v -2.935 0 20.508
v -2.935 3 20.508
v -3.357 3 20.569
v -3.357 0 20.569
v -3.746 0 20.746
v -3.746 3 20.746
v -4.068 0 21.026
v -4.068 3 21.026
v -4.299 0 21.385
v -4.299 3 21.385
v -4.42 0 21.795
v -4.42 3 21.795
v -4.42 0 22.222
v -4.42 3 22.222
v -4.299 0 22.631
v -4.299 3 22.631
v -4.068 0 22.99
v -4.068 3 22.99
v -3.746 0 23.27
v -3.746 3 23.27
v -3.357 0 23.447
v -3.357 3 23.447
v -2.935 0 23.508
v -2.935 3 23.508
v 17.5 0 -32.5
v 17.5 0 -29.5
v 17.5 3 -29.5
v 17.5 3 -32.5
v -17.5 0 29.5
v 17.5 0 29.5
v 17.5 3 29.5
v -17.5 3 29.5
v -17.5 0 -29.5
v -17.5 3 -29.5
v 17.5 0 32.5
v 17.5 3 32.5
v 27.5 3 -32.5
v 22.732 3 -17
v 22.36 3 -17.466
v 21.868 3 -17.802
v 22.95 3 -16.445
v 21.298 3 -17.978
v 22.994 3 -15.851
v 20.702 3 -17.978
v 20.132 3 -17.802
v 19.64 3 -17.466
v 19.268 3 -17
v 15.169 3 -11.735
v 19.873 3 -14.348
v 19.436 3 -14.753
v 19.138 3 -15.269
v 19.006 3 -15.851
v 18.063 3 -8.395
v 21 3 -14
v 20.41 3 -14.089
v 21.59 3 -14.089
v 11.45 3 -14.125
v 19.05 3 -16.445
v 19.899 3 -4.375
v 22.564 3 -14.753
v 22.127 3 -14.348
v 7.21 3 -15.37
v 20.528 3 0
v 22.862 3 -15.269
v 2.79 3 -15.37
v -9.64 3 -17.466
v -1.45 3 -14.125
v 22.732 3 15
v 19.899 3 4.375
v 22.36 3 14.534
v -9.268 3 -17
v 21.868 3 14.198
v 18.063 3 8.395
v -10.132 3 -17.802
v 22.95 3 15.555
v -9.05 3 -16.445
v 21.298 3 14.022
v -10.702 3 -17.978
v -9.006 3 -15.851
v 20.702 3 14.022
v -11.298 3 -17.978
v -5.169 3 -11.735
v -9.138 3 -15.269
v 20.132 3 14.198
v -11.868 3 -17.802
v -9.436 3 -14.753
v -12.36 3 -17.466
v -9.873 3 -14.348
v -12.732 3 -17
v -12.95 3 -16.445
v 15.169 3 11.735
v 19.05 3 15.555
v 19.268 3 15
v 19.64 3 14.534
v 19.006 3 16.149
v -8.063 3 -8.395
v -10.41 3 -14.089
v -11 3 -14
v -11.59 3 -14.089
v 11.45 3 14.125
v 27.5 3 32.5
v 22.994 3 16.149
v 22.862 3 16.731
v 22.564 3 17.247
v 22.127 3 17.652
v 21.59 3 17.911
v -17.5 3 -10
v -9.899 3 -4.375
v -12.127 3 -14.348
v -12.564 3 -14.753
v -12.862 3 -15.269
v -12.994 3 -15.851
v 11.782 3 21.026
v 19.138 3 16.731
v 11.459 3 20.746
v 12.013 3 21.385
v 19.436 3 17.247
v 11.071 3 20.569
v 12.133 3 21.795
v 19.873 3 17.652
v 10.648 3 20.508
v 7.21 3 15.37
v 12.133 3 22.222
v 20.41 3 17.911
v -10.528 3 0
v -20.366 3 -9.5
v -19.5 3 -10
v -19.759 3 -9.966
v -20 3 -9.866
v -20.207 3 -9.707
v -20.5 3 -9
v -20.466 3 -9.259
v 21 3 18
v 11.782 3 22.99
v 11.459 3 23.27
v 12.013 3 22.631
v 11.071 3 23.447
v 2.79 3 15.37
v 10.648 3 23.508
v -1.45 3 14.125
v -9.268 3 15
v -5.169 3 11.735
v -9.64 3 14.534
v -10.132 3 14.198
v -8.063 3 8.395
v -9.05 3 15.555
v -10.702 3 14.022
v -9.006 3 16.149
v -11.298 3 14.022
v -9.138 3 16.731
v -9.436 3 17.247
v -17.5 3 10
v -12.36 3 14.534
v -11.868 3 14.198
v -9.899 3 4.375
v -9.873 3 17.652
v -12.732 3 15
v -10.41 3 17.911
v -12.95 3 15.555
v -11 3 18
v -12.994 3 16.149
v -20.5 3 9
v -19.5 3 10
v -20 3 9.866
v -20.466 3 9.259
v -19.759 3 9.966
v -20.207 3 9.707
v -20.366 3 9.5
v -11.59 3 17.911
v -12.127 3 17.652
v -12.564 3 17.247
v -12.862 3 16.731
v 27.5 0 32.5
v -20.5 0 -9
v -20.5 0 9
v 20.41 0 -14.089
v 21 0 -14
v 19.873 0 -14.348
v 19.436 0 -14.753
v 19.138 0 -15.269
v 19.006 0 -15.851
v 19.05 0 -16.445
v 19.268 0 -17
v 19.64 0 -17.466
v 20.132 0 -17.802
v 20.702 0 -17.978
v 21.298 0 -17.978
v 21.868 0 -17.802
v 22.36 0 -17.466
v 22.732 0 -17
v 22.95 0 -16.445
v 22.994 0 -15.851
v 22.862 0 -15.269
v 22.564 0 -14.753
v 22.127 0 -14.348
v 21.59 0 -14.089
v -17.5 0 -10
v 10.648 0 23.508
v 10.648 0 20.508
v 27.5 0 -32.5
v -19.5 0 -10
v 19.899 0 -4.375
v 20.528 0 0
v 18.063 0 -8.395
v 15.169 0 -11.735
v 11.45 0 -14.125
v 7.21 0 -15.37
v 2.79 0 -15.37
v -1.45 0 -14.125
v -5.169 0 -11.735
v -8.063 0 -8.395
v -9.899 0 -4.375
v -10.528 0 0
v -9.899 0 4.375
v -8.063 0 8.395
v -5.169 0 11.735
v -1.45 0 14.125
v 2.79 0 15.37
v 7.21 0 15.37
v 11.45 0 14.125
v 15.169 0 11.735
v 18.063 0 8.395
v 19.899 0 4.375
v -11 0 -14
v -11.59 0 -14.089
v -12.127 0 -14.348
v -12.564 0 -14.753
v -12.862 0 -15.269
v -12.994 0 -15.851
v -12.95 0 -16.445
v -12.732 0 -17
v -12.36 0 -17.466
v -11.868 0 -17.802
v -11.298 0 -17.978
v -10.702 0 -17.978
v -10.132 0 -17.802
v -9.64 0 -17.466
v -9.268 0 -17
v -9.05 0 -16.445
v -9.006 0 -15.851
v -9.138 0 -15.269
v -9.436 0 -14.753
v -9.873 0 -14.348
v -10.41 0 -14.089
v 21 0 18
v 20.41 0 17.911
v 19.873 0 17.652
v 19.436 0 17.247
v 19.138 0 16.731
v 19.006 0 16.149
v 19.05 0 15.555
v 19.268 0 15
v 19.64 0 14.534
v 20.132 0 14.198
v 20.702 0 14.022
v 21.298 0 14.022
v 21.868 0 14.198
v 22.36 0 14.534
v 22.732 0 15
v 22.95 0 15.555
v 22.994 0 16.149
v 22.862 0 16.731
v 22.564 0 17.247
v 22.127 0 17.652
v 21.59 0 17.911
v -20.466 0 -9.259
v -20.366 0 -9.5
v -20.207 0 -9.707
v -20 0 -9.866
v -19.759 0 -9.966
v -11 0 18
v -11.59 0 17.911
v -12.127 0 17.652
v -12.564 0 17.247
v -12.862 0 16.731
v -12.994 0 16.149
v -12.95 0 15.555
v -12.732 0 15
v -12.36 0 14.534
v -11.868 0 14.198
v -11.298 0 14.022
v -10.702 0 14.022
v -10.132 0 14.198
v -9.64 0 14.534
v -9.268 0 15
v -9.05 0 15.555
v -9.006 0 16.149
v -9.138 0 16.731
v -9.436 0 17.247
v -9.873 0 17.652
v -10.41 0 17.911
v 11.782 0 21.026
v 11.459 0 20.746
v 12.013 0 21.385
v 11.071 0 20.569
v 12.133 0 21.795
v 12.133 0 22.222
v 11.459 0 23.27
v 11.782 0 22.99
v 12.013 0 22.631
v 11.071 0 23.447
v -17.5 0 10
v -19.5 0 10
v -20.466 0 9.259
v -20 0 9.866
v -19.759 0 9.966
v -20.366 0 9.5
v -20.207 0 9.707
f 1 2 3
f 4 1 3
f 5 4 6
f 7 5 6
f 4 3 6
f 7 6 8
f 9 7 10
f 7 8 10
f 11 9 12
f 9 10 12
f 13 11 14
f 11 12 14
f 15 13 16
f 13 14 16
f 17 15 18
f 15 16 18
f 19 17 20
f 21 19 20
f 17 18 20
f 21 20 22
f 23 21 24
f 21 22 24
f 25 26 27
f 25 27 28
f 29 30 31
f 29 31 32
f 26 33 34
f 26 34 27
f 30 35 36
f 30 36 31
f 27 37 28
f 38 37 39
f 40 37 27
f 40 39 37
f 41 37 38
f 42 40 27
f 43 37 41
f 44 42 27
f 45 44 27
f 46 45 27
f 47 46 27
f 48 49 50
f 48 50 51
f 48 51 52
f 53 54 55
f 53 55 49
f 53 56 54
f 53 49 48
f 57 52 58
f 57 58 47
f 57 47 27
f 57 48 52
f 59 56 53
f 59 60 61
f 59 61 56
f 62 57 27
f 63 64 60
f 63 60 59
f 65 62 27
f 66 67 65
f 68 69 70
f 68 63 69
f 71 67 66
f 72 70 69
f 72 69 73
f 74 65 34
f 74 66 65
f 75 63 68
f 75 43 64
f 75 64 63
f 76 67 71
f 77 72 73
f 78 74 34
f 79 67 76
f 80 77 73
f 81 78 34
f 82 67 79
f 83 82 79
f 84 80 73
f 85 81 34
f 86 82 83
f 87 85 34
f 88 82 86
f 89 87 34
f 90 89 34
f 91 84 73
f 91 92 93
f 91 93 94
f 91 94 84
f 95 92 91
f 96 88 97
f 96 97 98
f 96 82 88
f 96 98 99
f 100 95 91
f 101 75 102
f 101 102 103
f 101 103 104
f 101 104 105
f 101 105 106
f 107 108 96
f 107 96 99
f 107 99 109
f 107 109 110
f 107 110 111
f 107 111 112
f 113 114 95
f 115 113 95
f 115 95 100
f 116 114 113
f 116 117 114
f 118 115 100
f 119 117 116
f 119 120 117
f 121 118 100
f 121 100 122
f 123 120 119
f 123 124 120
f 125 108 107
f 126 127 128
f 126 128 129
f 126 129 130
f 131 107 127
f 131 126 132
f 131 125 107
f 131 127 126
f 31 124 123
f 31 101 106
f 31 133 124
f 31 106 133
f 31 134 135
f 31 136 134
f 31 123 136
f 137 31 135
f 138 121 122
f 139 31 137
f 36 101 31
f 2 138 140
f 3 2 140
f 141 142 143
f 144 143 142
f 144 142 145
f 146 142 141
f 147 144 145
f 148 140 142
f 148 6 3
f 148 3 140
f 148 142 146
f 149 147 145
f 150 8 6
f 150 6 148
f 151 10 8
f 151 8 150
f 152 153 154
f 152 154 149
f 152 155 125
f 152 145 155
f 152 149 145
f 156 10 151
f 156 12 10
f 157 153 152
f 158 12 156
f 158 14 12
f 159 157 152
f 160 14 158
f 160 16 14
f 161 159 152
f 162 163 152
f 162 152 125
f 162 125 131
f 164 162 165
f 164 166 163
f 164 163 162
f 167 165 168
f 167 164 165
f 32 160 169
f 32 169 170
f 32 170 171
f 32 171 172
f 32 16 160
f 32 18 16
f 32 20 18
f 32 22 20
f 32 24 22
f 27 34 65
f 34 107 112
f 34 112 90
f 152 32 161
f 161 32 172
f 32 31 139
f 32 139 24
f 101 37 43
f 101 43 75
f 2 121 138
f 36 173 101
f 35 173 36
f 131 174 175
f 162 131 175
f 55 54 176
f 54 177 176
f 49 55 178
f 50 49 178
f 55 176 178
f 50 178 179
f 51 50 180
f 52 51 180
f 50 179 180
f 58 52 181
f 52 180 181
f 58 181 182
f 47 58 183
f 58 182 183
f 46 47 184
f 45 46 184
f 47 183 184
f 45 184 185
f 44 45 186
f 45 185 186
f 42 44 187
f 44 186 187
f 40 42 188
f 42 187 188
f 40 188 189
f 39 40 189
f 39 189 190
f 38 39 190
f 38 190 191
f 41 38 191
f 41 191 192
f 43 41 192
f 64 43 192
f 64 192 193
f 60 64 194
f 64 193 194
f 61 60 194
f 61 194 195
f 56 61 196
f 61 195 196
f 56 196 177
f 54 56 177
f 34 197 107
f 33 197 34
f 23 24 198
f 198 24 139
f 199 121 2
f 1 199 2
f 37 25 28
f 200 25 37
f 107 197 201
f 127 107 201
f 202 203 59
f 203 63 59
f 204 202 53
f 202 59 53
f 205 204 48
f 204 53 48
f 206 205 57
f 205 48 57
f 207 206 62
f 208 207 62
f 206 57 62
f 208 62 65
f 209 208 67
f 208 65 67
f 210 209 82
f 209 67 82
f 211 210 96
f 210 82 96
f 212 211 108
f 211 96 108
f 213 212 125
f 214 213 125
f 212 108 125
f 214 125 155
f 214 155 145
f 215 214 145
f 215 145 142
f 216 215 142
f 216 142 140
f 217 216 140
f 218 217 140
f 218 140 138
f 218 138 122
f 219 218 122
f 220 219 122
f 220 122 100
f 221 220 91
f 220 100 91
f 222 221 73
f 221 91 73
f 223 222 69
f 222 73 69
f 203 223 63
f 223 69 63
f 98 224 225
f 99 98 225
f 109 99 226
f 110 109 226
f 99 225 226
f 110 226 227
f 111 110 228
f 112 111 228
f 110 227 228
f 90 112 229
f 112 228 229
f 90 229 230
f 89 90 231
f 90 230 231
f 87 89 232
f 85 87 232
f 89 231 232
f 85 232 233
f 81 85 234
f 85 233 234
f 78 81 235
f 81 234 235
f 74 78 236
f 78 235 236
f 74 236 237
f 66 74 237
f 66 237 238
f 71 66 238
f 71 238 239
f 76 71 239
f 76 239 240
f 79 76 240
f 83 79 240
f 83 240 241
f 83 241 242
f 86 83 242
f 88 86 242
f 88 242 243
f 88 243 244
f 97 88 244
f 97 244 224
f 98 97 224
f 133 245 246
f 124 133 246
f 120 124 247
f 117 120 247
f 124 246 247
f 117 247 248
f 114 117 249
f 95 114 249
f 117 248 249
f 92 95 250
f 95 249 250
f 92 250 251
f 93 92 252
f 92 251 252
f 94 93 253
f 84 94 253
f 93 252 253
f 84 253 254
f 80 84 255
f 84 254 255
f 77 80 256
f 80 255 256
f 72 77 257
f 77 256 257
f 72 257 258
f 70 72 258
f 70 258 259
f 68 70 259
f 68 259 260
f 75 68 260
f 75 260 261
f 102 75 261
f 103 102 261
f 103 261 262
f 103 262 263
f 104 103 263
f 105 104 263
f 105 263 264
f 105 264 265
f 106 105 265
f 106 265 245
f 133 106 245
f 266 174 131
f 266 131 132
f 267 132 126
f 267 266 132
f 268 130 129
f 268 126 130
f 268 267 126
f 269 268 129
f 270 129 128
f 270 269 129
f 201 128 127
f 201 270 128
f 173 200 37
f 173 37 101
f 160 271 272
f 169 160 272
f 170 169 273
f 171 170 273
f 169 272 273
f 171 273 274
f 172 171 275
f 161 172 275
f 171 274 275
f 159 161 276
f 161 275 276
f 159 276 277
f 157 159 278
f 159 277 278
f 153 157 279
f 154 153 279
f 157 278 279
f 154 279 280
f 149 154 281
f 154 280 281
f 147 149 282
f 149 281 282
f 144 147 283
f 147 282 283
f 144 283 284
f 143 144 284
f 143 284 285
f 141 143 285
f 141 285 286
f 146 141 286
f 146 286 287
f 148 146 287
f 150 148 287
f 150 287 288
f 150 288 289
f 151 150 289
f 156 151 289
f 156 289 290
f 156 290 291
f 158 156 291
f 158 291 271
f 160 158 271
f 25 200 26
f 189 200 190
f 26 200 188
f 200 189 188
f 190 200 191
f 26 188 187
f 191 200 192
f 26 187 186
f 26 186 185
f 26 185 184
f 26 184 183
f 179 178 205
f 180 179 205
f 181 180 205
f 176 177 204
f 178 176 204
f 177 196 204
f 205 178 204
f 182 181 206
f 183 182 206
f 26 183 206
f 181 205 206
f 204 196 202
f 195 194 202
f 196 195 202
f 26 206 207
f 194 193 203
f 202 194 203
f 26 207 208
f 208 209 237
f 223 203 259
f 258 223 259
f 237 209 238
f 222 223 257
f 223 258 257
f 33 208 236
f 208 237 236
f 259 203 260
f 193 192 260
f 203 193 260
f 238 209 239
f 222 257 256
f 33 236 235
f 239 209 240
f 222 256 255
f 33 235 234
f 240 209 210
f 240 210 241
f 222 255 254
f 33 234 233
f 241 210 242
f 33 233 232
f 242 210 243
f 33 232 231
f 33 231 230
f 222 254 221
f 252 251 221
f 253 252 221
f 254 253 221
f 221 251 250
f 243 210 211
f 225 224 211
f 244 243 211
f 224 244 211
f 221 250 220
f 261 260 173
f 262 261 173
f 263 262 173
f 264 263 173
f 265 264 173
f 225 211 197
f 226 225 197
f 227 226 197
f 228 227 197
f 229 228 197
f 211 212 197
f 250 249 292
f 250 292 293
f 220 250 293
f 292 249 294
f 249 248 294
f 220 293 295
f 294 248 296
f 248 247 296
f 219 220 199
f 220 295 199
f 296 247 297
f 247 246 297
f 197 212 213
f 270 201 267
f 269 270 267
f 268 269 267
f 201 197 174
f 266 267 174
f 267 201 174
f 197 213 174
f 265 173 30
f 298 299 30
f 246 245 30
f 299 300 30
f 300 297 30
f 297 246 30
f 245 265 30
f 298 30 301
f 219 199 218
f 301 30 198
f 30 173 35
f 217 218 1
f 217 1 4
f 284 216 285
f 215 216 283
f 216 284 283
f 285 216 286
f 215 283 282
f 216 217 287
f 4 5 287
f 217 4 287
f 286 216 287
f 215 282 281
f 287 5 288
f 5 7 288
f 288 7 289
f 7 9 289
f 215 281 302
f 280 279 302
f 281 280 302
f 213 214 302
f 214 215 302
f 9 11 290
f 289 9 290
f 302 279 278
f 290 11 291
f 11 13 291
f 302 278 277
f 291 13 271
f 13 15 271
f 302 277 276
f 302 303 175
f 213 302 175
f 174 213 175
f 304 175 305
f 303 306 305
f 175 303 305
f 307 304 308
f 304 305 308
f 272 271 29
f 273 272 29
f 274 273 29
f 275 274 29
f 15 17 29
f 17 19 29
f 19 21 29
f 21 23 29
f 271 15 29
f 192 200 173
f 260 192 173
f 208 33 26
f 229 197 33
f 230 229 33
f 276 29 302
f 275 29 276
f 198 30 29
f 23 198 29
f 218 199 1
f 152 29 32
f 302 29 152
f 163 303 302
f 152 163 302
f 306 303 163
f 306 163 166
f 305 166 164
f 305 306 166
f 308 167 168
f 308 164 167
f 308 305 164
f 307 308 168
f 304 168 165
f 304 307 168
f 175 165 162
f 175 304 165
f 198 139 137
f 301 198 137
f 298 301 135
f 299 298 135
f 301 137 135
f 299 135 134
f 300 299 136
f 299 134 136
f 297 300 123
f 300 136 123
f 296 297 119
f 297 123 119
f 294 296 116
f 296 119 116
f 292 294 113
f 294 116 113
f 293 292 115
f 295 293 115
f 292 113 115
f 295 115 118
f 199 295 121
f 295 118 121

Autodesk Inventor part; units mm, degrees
ref_plane "YZ Plane" through (0, 0, 0) normal (1, 0, 0) x (0, 1, 0)
ref_plane "XZ Plane" through (0, 0, 0) normal (0, 1, 0) x (-1, 0, 0)
ref_plane "XY Plane" through (0, 0, 0) normal (0, 0, 1) x (1, 0, 0)
sketch "Sketch1" plane through (0, 0, 0) normal (0, 1, 0) x (-1, 0, 0)
  line L0 (17.5, -29.5) -> (-17.5, -29.5)
  line L1 (-17.5, -29.5) -> (-17.5, -32.5)
  line L2 (-17.5, -32.5) -> (-27.5, -32.5)
  line L3 (-27.5, -32.5) -> (-27.5, 32.5)
  line L4 (-27.5, 32.5) -> (-17.5, 32.5)
  line L5 (-17.5, 32.5) -> (-17.5, 29.5)
  line L6 (-17.5, 29.5) -> (17.5, 29.5)
  line L7 (17.5, -10) -> (19.5, -10)
  line L8 (20.5, -9) -> (20.5, 9)
  line L9 (19.5, 10) -> (17.5, 10)
  line L10 (17.5, 29.5) -> (17.5, 10)
  line L11 (17.5, -10) -> (17.5, -29.5)
  arc A0 (20.5, 9) -> (19.5, 10) centre (19.5, 9) ccw
  arc A1 (19.5, -10) -> (20.5, -9) centre (19.5, -9) ccw
  point P0 (0, 0)
  point P1 (-27.5, 0)
  point P2 (0, -29.5)
  point P3 (20.5, 0)
  dimension "d19" = 59
  dimension "d20" = 45
  dimension "d21" = 10
  dimension "d22" = 3
  dimension "d23" = 20
  dimension "d26" = 2
  dimension "d27" = 3
extrude "Extrusion1" add sketch "Sketch1" along normal blind 3
sketch "Sketch2" plane through (0, 3, 0) normal (0, 1, 0) x (1, 0, 0)
  line L0 (-11, 16) -> (21, 16) construction
  line L1 (-17.5, 29.5) -> (-17.5, 10) projected
  line L2 (27.5, -32.5) -> (27.5, 32.5) projected
  line L3 (-17.5, 25.7242) -> (27.5, 25.7242) construction
  point P0 (0, 0)
  point P1 (-11, -16)
  point P2 (21, -16)
  point P3 (5, 25.7242)
  point P4 (5, 16)
  dimension "d7" = 32
  dimension "d8" = 32
  dimension "d10" = 16
hole "Hole1" at (-11, 3, 16) at (-11, 3, -16) at (21, 3, 16) at (21, 3, -16) direction (0, -1, 0) diameter 4 end through all
sketch "Sketch3" plane through (0, 3, 0) normal (0, 1, 0) x (1, 0, 0)
  circle A0 centre (21, -16) radius 2 projected
  circle A1 centre (-11, -16) radius 2 projected
  circle A2 centre (-11, 16) radius 2 projected
  circle A3 centre (21, 16) radius 2 projected
  line L0 (17.5, 29.5) -> (-17.5, 29.5) projected
  line L1 (-17.5, 29.5) -> (-17.5, 10) projected
  line L2 (-17.5, 10) -> (-19.5, 10) projected
  line L3 (-20.5, 9) -> (-20.5, -9) projected
  line L4 (-19.5, -10) -> (-17.5, -10) projected
  line L5 (-17.5, -10) -> (-17.5, -29.5) projected
  line L6 (-17.5, -29.5) -> (17.5, -29.5) projected
  line L7 (17.5, -29.5) -> (17.5, -32.5) projected
  line L8 (17.5, -32.5) -> (27.5, -32.5) projected
  line L9 (27.5, -32.5) -> (27.5, 32.5) projected
  line L10 (27.5, 32.5) -> (17.5, 32.5) projected
  line L11 (17.5, 32.5) -> (17.5, 29.5) projected
  line L12 (-11, 16) -> (21, -16) construction
  line L13 (-11, -16) -> (21, 16) construction
  circle A4 centre (5, 0) radius 15.5278
  arc A5 (-19.5, 10) -> (-20.5, 9) centre (-19.5, 9) ccw projected
  arc A6 (-20.5, -9) -> (-19.5, -10) centre (-19.5, -9) ccw projected
  line L14 (-2.9348, -23.5081) -> (10.6481, -23.5081)
  line L15 (10.6481, -20.5081) -> (-2.9348, -20.5081)
  arc A7 (-2.9348, -20.5081) -> (-2.9348, -23.5081) centre (-2.9348, -22.0081) ccw
  arc A8 (10.6481, -23.5081) -> (10.6481, -20.5081) centre (10.6481, -22.0081) ccw
  point P0 (0, 0)
  dimension "d28" = 3
extrude "Extrusion2" cut sketch "Sketch3" against normal up to next contours A4 | A7 L15 A8 L14
equation "\"d27\" = d22"
equation "\"d8\" = d7"
equation "\"d10\" = d9"
equation "\"d9\" = 0.5 * d7"
properties part number "Fan_plate" material "Polycarbonate, Smoke"
